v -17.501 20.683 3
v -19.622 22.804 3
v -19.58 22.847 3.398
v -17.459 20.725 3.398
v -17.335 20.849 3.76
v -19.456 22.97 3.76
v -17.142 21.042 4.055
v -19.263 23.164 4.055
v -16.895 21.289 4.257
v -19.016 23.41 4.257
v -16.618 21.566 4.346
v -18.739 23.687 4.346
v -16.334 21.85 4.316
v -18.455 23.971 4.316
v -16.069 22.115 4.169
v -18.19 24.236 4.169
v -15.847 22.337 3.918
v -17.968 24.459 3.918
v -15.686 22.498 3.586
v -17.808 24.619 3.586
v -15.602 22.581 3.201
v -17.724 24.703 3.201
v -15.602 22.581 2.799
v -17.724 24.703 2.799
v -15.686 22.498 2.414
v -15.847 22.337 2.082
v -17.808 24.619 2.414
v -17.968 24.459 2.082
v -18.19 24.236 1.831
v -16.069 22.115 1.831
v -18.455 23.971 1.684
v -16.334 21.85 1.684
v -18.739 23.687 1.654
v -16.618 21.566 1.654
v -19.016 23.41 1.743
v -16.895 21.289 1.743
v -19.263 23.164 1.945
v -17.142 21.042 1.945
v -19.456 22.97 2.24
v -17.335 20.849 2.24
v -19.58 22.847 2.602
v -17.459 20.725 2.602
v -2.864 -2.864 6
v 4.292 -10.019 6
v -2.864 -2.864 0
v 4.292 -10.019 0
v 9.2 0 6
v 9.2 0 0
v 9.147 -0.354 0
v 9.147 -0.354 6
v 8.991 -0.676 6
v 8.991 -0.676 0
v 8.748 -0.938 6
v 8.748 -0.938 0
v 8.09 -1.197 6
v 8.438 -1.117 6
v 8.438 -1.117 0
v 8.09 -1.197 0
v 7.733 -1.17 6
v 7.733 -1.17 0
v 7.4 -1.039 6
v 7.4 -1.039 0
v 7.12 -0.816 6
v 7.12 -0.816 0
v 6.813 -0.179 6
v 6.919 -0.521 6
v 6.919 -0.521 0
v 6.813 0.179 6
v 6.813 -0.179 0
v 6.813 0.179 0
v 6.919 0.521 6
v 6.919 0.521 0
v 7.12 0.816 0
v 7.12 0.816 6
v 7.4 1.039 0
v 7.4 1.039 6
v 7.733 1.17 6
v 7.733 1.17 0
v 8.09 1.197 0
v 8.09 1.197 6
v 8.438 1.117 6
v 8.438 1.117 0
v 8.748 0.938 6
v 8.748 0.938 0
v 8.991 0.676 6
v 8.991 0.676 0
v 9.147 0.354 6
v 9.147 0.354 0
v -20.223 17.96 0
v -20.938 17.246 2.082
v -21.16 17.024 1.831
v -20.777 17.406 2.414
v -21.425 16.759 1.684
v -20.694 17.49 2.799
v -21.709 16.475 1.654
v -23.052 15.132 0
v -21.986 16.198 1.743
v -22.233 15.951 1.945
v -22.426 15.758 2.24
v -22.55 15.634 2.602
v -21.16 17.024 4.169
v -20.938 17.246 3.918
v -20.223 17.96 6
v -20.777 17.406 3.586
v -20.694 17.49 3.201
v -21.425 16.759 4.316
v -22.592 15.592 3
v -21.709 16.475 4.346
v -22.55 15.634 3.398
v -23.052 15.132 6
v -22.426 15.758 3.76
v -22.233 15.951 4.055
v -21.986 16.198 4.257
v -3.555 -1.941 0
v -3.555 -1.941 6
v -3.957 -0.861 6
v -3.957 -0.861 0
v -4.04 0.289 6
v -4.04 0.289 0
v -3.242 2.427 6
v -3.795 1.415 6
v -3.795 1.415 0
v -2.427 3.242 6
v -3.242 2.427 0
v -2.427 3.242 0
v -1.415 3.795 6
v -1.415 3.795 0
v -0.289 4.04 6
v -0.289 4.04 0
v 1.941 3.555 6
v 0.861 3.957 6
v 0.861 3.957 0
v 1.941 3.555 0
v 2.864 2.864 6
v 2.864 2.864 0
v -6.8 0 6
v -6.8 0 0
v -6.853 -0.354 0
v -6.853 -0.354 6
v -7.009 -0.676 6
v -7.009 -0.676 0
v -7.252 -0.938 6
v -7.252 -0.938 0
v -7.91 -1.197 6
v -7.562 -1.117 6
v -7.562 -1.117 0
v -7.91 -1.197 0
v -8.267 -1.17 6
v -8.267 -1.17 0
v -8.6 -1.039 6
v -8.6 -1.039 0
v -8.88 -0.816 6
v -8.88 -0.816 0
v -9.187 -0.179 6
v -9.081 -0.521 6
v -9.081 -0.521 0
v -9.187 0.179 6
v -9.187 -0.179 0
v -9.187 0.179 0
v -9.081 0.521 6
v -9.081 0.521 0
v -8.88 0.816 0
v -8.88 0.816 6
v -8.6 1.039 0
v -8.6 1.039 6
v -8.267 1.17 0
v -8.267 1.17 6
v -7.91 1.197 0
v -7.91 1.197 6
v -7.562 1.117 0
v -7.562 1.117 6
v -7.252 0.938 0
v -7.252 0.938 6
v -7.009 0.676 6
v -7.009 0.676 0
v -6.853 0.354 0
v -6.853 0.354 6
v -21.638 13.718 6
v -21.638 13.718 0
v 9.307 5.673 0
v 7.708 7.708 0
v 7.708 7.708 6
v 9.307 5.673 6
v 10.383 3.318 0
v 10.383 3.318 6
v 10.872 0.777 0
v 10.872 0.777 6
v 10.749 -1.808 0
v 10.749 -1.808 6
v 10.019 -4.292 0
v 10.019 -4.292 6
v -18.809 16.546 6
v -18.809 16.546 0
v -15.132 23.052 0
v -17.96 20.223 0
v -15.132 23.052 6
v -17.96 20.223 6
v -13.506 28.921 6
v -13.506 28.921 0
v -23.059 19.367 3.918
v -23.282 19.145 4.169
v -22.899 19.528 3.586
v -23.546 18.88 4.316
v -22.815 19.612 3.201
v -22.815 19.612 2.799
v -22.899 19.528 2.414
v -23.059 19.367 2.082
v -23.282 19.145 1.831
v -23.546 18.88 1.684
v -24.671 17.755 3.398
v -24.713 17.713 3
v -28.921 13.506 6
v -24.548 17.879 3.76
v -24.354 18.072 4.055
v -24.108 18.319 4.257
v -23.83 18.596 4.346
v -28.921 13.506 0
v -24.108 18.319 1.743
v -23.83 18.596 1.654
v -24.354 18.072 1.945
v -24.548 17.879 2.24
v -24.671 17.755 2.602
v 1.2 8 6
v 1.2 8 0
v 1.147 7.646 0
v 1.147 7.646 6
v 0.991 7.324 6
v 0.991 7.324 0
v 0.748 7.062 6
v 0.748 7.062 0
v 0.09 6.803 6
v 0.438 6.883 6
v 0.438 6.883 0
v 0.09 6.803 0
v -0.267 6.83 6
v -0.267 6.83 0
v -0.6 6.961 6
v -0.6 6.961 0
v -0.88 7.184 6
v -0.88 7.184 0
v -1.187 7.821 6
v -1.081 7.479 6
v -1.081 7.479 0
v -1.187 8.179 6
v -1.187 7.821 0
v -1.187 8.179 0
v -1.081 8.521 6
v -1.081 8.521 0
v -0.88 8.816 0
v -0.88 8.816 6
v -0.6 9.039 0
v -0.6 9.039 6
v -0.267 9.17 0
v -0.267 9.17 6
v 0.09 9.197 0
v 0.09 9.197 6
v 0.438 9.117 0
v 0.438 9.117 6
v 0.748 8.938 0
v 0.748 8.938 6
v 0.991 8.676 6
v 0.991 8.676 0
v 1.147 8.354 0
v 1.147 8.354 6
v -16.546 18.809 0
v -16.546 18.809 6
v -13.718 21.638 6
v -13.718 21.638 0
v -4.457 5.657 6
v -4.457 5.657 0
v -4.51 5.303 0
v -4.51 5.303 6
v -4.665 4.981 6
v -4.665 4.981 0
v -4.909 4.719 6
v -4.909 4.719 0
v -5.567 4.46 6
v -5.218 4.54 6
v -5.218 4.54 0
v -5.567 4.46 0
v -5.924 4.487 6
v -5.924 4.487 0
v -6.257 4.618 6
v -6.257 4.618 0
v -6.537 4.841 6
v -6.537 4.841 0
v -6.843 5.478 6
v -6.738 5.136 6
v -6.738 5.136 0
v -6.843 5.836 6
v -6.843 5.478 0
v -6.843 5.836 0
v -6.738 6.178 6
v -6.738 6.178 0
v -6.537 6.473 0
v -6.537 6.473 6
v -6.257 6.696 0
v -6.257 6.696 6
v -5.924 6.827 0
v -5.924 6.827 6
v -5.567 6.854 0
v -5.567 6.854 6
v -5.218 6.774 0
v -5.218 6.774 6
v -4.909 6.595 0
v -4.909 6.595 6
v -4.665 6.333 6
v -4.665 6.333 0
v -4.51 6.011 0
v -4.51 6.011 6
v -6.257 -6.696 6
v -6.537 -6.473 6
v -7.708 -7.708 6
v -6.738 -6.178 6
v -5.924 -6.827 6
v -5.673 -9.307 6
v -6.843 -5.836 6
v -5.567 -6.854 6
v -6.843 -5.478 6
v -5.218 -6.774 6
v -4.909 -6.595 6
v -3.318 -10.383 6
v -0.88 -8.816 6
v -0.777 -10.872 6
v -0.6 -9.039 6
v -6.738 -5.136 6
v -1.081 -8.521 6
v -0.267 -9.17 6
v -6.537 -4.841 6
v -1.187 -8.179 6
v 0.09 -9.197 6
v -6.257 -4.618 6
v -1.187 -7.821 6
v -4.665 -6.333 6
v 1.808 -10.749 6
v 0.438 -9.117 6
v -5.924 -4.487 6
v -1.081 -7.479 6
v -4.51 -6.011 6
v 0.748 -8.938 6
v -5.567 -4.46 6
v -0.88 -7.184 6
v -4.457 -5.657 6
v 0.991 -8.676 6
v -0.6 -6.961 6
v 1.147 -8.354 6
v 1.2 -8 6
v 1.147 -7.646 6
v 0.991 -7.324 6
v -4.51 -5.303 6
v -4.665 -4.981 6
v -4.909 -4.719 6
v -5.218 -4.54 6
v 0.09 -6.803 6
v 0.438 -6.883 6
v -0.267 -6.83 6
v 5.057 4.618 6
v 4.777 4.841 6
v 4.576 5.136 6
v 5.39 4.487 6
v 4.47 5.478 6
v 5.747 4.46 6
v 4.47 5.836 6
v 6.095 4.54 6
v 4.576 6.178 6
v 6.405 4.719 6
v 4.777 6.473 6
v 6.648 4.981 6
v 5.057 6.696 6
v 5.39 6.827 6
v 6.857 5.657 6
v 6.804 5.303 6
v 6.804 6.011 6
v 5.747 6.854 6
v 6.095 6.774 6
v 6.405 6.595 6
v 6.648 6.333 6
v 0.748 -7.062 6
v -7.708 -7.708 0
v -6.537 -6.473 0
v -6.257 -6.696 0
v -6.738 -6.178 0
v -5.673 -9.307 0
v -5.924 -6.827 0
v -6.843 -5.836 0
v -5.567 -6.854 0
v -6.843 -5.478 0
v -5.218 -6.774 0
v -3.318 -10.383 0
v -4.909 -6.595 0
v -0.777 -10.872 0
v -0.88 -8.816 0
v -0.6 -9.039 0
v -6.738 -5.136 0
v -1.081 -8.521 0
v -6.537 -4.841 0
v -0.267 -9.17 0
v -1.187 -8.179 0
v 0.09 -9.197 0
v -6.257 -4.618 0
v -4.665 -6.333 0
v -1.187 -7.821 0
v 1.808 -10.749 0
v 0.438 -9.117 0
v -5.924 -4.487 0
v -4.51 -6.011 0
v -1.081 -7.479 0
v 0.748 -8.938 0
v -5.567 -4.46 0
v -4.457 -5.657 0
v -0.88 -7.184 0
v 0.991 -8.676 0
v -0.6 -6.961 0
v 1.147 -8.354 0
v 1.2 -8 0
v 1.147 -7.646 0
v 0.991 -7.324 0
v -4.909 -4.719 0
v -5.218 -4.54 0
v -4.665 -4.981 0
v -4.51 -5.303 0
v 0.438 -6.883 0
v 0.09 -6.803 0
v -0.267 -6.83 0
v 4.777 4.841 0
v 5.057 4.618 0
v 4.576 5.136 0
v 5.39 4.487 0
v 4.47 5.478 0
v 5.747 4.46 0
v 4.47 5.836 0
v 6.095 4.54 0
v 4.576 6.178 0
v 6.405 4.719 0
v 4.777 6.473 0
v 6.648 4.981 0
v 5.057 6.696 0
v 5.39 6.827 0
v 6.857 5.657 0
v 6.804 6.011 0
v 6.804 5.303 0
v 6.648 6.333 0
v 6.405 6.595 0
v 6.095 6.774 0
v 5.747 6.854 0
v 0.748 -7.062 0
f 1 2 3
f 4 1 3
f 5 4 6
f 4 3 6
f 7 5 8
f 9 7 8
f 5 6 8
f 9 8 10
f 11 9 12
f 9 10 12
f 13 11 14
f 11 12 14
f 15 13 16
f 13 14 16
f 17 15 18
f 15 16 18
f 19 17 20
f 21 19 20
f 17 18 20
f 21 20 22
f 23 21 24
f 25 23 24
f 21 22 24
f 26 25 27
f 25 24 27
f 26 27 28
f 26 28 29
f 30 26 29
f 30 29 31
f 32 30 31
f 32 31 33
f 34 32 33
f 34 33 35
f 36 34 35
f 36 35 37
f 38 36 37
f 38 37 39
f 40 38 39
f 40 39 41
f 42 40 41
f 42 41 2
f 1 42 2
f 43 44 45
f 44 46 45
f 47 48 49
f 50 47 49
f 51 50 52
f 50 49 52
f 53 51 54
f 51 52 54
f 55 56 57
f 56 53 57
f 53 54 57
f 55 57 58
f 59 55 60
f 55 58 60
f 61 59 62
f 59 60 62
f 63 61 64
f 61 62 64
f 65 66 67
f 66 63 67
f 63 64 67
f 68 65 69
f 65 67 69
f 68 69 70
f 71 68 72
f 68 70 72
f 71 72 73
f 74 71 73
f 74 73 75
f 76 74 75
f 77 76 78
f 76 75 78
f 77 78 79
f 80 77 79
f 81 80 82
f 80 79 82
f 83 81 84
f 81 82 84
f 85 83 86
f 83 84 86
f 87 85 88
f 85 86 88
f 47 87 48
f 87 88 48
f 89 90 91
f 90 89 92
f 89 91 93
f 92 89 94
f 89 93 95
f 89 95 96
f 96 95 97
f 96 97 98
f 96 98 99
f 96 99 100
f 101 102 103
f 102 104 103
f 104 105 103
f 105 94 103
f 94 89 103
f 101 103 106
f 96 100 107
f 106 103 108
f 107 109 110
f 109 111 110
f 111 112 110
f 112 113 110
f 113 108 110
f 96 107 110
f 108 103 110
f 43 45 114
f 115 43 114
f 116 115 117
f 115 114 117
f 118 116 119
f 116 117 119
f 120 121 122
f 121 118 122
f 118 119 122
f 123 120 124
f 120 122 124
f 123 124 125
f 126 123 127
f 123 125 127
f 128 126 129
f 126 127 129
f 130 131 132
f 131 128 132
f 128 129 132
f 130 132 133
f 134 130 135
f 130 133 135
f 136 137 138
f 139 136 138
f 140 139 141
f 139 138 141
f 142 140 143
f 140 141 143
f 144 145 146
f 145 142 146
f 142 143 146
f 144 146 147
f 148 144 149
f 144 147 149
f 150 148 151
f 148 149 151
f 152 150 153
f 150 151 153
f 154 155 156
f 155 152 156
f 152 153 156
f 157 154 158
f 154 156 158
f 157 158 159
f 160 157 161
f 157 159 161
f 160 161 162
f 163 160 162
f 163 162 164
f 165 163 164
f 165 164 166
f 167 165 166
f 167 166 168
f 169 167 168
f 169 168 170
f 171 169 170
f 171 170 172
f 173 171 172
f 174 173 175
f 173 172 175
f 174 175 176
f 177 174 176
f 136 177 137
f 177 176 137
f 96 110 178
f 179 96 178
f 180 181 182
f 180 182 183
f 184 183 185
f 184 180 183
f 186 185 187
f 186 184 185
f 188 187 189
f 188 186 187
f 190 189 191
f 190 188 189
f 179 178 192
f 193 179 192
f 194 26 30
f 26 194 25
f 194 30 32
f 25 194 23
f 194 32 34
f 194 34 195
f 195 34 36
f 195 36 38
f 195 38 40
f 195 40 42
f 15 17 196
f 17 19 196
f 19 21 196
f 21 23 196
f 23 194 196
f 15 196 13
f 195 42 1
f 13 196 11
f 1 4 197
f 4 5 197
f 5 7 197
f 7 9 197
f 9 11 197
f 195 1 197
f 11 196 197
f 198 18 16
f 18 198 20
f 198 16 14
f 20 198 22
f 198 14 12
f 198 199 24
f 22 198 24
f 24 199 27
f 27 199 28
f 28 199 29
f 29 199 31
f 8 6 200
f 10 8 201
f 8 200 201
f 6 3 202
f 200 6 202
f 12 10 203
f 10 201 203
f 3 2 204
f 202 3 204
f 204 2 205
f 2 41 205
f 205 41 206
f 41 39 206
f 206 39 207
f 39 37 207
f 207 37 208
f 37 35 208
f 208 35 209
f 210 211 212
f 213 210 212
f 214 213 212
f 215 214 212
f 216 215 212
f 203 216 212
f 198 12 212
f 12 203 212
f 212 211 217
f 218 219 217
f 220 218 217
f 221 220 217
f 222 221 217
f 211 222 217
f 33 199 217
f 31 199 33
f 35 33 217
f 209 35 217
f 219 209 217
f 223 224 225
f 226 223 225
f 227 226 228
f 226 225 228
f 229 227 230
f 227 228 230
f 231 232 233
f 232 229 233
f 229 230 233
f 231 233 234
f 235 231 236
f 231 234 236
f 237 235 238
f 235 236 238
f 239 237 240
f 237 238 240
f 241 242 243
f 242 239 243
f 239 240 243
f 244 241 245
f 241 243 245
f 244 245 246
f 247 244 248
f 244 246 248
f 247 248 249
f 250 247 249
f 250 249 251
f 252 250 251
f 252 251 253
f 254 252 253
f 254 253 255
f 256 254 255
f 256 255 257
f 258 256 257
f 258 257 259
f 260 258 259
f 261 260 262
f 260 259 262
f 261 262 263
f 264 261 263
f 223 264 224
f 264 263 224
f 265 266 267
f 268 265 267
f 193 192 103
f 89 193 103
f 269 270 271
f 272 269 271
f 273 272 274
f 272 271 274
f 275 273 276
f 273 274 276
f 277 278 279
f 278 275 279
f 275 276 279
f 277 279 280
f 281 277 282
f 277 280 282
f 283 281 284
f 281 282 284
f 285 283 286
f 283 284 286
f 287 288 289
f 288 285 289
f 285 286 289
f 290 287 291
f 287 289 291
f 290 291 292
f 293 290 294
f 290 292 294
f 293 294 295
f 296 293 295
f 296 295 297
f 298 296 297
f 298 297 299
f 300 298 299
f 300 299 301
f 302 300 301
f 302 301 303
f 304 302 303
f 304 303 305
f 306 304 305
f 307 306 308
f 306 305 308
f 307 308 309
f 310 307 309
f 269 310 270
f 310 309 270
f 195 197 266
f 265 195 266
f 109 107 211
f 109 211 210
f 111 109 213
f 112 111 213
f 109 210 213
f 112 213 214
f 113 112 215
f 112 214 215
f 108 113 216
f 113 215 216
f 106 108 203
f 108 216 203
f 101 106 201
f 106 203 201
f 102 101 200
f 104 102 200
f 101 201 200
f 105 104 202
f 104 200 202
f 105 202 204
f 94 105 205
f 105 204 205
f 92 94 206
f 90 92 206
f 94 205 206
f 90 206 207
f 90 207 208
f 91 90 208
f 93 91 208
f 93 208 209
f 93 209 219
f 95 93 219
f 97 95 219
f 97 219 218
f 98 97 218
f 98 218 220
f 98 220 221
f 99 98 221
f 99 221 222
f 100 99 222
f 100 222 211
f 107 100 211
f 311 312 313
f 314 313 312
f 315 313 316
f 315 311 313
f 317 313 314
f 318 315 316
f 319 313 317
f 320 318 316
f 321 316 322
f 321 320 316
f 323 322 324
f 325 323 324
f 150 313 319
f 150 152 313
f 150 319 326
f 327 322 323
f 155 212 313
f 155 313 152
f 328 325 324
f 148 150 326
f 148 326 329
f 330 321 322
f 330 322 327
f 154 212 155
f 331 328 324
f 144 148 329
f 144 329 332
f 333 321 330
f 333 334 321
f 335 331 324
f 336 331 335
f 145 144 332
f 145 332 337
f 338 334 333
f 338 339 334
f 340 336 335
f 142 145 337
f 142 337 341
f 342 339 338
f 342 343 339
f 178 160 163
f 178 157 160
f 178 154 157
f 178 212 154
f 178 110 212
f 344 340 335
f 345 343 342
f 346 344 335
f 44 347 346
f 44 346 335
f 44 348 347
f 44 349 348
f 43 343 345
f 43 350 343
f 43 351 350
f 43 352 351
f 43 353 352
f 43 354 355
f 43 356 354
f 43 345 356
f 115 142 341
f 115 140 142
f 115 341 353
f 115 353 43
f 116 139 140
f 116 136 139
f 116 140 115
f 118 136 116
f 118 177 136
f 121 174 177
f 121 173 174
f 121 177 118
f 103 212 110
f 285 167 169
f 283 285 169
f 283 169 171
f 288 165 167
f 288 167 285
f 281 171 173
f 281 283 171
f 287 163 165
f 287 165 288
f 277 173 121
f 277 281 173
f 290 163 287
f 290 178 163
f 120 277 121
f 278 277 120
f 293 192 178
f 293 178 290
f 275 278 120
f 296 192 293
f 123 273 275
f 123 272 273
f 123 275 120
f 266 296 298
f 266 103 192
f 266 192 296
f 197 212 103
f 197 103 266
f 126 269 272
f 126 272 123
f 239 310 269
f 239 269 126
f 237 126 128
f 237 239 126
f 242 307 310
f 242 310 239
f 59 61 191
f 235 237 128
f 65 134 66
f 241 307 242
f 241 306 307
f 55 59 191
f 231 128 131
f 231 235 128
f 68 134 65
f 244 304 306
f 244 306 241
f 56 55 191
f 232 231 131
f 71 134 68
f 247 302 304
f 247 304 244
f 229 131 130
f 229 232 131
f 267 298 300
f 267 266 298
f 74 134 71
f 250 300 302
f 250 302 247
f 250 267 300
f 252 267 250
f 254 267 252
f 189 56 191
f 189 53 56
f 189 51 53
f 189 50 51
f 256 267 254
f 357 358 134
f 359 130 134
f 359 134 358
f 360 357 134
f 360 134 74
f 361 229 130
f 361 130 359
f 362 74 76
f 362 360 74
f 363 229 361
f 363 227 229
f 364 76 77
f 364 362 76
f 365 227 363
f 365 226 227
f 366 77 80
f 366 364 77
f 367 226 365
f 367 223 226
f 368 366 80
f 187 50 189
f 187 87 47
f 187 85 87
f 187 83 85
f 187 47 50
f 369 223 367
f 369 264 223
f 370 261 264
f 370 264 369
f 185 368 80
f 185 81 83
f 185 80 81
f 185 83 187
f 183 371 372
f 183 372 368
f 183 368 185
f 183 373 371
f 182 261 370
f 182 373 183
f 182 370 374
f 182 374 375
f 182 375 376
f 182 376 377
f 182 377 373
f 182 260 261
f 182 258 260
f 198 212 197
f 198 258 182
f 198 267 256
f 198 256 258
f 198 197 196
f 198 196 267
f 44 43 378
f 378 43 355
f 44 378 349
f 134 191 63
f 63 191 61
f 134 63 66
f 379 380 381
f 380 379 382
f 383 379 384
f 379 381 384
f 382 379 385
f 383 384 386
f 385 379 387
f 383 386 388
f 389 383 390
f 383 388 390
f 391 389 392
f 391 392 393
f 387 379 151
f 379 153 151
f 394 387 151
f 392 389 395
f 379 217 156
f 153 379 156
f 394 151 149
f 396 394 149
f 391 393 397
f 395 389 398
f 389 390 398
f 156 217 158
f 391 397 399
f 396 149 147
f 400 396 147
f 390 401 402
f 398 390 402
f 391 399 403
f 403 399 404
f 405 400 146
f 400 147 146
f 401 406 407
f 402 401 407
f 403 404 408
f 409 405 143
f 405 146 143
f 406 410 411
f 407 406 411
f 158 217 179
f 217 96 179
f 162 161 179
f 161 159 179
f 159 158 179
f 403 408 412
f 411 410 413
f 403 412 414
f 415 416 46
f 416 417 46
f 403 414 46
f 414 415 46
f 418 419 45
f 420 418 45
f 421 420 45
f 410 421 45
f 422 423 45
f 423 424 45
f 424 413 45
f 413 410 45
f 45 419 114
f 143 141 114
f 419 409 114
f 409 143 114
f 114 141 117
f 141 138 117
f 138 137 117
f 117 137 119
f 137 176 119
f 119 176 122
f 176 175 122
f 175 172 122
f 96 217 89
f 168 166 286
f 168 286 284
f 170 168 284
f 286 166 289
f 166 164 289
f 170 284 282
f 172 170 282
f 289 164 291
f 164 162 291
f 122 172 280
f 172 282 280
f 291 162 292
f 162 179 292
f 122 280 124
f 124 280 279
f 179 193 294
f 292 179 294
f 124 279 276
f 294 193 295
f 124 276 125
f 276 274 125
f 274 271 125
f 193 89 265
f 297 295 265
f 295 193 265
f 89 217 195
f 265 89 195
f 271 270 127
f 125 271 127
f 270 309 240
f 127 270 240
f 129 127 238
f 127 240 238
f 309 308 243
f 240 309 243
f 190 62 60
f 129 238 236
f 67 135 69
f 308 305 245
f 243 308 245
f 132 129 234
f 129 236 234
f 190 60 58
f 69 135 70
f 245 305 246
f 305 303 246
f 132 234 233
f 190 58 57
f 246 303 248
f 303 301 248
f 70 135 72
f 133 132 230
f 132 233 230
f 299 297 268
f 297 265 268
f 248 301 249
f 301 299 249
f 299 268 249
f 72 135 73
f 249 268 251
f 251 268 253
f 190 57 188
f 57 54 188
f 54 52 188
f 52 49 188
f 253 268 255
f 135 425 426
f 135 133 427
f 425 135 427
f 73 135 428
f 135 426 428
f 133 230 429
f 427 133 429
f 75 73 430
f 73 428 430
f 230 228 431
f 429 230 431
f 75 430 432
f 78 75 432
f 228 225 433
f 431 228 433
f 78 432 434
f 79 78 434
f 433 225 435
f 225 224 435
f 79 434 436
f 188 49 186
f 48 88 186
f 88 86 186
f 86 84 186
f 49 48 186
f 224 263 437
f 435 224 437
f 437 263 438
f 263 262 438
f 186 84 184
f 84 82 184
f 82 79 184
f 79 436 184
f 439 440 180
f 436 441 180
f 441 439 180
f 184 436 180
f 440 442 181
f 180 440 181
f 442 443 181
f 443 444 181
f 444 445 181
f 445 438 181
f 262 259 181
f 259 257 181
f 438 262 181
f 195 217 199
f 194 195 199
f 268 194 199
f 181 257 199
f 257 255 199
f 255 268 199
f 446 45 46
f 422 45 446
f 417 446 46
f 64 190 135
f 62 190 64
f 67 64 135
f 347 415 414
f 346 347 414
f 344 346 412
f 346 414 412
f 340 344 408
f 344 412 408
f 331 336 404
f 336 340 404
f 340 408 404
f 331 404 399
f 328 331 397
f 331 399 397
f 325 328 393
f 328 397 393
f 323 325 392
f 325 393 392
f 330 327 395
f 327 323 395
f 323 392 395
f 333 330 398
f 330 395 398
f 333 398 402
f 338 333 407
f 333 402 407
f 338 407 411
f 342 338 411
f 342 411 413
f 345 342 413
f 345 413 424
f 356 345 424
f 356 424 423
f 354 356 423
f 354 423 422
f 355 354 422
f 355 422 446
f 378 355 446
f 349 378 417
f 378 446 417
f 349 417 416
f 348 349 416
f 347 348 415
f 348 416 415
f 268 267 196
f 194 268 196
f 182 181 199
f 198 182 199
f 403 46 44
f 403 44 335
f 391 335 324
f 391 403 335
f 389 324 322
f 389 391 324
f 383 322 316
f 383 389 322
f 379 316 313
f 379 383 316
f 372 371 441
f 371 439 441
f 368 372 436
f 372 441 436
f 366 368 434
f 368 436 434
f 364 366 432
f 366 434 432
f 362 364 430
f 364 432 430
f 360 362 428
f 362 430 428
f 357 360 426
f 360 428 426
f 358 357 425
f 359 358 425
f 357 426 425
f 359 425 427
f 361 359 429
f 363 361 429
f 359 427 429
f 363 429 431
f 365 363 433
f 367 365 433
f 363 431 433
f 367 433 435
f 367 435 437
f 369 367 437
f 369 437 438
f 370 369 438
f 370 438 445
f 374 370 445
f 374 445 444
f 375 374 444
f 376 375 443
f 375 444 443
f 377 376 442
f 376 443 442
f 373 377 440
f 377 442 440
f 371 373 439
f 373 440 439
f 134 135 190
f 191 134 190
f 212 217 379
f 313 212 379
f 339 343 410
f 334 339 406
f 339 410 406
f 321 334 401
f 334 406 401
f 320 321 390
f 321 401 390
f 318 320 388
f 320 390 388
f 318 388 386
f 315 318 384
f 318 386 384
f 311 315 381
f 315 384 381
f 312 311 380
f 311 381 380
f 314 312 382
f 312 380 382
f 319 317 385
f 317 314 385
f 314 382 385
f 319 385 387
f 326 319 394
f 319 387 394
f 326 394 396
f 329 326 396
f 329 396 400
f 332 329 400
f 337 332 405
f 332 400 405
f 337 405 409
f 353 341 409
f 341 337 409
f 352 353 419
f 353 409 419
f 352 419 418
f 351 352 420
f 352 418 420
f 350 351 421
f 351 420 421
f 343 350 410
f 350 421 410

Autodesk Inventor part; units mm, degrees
ref_plane "YZ Plane" through (0, 0, 0) normal (1, 0, 0) x (0, 1, 0)
ref_plane "XZ Plane" through (0, 0, 0) normal (0, 1, 0) x (-1, 0, 0)
ref_plane "XY Plane" through (0, 0, 0) normal (0, 0, 1) x (1, 0, 0)
sketch "스케치1" plane through (0, 0, 0) normal (0, 0, 1) x (1, 0, 0)
  circle A0 centre (-5.6569, -5.6569) radius 1.2 projected
  circle A1 centre (5.6569, -5.6569) radius 1.2 projected
  circle A2 centre (5.6569, 5.6569) radius 1.2 projected
  circle A3 centre (-5.6569, 5.6569) radius 1.2 projected
  circle A4 centre (0, 0) radius 4 projected
  circle A5 centre (0, 0) radius 10.9 projected
  circle A6 centre (0, 8) radius 1.2 projected
  circle A7 centre (8, 0) radius 1.2 projected
  circle A8 centre (0, -8) radius 1.2 projected
  circle A9 centre (-8, 0) radius 1.2 projected
  circle A10 centre (0, 0) radius 4.05
  line L0 (-5.6569, -5.6569) -> (5.6569, 5.6569)
  line L1 (-2.8638, -2.8638) -> (2.8638, 2.8638)
  line L2 (2.8638, 2.8638) -> (13.4704, -7.7428)
  line L3 (13.4704, -7.7428) -> (7.7428, -13.4704)
  line L4 (7.7428, -13.4704) -> (-2.8638, -2.8638)
  line L5 (-5.6569, -5.6569) -> (-8.1671, -8.1671)
  line L6 (5.6569, 5.6569) -> (8.1671, 8.1671)
  line L7 (-7.7075, -7.7075) -> (7.7075, 7.7075)
  line L8 (7.7075, 7.7075) -> (-13.5057, 28.9207)
  line L9 (-13.5057, 28.9207) -> (-28.9207, 13.5057)
  line L10 (-28.9207, 13.5057) -> (-7.7075, -7.7075)
  point P0 (0, 0)
  point P1 (10.0195, -4.2919)
  point P2 (4.2919, -10.0195)
  dimension "d0" = 8.1
  dimension "d1" = 15
  dimension "d2" = 30
extrude "돌출1" add sketch "스케치1" along normal blind 6 contours A0 L0 L4 A5 L5 | A0 L5 A5 L6 A2 L0 A10 | L10 L9 L8 A5 | L0 A2 L6 A5 L2
sketch "스케치4" plane through (-28.9207, 13.5057, 0) normal (-0.7071, 0.7071, 0) x (-0.7071, -0.7071, 0)
  line L0 (0, 6) -> (-7.3, 6) projected
  line L1 (-21.8, 6) -> (0, 6) projected
  line L2 (-21.8, 0) -> (0, 0) projected
  line L3 (0, 0) -> (0, 6) projected
  line L4 (-21.8, 6) -> (0, 6) projected
  line L5 (-21.8, 0) -> (-21.8, 6) projected
  line L6 (-21.8, 0) -> (-14.5, 0)
  line L7 (-14.5, 0) -> (-14.5, 6)
  line L8 (-14.5, 0) -> (-14.5, 6)
  line L9 (-14.5, 6) -> (-7.3, 6)
  line L10 (-7.3, 6) -> (-7.3, 0)
  line L11 (-7.3, 0) -> (-14.5, 0)
  line L12 (-14.5, 6) -> (-14.5, 3)
  line L13 (-7.3, 3) -> (-14.5, 3)
  circle A0 centre (-7.3, 3) radius 1.35
  circle A1 centre (-14.5, 3) radius 1.35
  point P0 (-10.9, 0)
  dimension "d19" = 7.3
  dimension "d20" = 2.7
  dimension "d21" = 2.7
extrude "돌출3" cut sketch "스케치4" against normal blind 4 contours A0 L10 | L10 L13 A0 | A1 L13 L7 | L7 A1 | L10 A0 L13 | L13 A1 L7
sketch "스케치5" plane through (0, 0, 6) normal (0, 0, 1) x (1, 0, 0)
  line L0 (-21.885, 14.8846) -> (-19.9758, 16.7938) projected
  line L1 (-16.7938, 19.9758) -> (-14.8846, 21.885) projected
  line L2 (-18.809, 16.5463) -> (-20.2233, 17.9605)
  line L3 (-20.2233, 17.9605) -> (-23.0517, 15.1321)
  line L4 (-23.0517, 15.1321) -> (-21.6375, 13.7179)
  line L5 (-21.6375, 13.7179) -> (-18.809, 16.5463)
  line L6 (-18.809, 16.5463) -> (-23.0517, 15.1321) construction
  line L7 (-20.2233, 17.9605) -> (-21.6375, 13.7179) construction
  line L8 (-13.7179, 21.6375) -> (-15.1321, 23.0517)
  line L9 (-15.1321, 23.0517) -> (-17.9605, 20.2233)
  line L10 (-17.9605, 20.2233) -> (-16.5463, 18.809)
  line L11 (-16.5463, 18.809) -> (-13.7179, 21.6375)
  line L12 (-13.7179, 21.6375) -> (-17.9605, 20.2233) construction
  line L13 (-15.1321, 23.0517) -> (-16.5463, 18.809) construction
  point P0 (0, 0)
  point P1 (-20.9304, 15.8392)
  point P2 (-15.8392, 20.9304)
  dimension "d24" = 2
  dimension "d25" = 4
  dimension "d26" = 2
  dimension "d27" = 4
extrude "돌출4" cut sketch "스케치5" against normal blind 6
properties part number "_armpit_adt_1" material "PMMA 플라스틱"
